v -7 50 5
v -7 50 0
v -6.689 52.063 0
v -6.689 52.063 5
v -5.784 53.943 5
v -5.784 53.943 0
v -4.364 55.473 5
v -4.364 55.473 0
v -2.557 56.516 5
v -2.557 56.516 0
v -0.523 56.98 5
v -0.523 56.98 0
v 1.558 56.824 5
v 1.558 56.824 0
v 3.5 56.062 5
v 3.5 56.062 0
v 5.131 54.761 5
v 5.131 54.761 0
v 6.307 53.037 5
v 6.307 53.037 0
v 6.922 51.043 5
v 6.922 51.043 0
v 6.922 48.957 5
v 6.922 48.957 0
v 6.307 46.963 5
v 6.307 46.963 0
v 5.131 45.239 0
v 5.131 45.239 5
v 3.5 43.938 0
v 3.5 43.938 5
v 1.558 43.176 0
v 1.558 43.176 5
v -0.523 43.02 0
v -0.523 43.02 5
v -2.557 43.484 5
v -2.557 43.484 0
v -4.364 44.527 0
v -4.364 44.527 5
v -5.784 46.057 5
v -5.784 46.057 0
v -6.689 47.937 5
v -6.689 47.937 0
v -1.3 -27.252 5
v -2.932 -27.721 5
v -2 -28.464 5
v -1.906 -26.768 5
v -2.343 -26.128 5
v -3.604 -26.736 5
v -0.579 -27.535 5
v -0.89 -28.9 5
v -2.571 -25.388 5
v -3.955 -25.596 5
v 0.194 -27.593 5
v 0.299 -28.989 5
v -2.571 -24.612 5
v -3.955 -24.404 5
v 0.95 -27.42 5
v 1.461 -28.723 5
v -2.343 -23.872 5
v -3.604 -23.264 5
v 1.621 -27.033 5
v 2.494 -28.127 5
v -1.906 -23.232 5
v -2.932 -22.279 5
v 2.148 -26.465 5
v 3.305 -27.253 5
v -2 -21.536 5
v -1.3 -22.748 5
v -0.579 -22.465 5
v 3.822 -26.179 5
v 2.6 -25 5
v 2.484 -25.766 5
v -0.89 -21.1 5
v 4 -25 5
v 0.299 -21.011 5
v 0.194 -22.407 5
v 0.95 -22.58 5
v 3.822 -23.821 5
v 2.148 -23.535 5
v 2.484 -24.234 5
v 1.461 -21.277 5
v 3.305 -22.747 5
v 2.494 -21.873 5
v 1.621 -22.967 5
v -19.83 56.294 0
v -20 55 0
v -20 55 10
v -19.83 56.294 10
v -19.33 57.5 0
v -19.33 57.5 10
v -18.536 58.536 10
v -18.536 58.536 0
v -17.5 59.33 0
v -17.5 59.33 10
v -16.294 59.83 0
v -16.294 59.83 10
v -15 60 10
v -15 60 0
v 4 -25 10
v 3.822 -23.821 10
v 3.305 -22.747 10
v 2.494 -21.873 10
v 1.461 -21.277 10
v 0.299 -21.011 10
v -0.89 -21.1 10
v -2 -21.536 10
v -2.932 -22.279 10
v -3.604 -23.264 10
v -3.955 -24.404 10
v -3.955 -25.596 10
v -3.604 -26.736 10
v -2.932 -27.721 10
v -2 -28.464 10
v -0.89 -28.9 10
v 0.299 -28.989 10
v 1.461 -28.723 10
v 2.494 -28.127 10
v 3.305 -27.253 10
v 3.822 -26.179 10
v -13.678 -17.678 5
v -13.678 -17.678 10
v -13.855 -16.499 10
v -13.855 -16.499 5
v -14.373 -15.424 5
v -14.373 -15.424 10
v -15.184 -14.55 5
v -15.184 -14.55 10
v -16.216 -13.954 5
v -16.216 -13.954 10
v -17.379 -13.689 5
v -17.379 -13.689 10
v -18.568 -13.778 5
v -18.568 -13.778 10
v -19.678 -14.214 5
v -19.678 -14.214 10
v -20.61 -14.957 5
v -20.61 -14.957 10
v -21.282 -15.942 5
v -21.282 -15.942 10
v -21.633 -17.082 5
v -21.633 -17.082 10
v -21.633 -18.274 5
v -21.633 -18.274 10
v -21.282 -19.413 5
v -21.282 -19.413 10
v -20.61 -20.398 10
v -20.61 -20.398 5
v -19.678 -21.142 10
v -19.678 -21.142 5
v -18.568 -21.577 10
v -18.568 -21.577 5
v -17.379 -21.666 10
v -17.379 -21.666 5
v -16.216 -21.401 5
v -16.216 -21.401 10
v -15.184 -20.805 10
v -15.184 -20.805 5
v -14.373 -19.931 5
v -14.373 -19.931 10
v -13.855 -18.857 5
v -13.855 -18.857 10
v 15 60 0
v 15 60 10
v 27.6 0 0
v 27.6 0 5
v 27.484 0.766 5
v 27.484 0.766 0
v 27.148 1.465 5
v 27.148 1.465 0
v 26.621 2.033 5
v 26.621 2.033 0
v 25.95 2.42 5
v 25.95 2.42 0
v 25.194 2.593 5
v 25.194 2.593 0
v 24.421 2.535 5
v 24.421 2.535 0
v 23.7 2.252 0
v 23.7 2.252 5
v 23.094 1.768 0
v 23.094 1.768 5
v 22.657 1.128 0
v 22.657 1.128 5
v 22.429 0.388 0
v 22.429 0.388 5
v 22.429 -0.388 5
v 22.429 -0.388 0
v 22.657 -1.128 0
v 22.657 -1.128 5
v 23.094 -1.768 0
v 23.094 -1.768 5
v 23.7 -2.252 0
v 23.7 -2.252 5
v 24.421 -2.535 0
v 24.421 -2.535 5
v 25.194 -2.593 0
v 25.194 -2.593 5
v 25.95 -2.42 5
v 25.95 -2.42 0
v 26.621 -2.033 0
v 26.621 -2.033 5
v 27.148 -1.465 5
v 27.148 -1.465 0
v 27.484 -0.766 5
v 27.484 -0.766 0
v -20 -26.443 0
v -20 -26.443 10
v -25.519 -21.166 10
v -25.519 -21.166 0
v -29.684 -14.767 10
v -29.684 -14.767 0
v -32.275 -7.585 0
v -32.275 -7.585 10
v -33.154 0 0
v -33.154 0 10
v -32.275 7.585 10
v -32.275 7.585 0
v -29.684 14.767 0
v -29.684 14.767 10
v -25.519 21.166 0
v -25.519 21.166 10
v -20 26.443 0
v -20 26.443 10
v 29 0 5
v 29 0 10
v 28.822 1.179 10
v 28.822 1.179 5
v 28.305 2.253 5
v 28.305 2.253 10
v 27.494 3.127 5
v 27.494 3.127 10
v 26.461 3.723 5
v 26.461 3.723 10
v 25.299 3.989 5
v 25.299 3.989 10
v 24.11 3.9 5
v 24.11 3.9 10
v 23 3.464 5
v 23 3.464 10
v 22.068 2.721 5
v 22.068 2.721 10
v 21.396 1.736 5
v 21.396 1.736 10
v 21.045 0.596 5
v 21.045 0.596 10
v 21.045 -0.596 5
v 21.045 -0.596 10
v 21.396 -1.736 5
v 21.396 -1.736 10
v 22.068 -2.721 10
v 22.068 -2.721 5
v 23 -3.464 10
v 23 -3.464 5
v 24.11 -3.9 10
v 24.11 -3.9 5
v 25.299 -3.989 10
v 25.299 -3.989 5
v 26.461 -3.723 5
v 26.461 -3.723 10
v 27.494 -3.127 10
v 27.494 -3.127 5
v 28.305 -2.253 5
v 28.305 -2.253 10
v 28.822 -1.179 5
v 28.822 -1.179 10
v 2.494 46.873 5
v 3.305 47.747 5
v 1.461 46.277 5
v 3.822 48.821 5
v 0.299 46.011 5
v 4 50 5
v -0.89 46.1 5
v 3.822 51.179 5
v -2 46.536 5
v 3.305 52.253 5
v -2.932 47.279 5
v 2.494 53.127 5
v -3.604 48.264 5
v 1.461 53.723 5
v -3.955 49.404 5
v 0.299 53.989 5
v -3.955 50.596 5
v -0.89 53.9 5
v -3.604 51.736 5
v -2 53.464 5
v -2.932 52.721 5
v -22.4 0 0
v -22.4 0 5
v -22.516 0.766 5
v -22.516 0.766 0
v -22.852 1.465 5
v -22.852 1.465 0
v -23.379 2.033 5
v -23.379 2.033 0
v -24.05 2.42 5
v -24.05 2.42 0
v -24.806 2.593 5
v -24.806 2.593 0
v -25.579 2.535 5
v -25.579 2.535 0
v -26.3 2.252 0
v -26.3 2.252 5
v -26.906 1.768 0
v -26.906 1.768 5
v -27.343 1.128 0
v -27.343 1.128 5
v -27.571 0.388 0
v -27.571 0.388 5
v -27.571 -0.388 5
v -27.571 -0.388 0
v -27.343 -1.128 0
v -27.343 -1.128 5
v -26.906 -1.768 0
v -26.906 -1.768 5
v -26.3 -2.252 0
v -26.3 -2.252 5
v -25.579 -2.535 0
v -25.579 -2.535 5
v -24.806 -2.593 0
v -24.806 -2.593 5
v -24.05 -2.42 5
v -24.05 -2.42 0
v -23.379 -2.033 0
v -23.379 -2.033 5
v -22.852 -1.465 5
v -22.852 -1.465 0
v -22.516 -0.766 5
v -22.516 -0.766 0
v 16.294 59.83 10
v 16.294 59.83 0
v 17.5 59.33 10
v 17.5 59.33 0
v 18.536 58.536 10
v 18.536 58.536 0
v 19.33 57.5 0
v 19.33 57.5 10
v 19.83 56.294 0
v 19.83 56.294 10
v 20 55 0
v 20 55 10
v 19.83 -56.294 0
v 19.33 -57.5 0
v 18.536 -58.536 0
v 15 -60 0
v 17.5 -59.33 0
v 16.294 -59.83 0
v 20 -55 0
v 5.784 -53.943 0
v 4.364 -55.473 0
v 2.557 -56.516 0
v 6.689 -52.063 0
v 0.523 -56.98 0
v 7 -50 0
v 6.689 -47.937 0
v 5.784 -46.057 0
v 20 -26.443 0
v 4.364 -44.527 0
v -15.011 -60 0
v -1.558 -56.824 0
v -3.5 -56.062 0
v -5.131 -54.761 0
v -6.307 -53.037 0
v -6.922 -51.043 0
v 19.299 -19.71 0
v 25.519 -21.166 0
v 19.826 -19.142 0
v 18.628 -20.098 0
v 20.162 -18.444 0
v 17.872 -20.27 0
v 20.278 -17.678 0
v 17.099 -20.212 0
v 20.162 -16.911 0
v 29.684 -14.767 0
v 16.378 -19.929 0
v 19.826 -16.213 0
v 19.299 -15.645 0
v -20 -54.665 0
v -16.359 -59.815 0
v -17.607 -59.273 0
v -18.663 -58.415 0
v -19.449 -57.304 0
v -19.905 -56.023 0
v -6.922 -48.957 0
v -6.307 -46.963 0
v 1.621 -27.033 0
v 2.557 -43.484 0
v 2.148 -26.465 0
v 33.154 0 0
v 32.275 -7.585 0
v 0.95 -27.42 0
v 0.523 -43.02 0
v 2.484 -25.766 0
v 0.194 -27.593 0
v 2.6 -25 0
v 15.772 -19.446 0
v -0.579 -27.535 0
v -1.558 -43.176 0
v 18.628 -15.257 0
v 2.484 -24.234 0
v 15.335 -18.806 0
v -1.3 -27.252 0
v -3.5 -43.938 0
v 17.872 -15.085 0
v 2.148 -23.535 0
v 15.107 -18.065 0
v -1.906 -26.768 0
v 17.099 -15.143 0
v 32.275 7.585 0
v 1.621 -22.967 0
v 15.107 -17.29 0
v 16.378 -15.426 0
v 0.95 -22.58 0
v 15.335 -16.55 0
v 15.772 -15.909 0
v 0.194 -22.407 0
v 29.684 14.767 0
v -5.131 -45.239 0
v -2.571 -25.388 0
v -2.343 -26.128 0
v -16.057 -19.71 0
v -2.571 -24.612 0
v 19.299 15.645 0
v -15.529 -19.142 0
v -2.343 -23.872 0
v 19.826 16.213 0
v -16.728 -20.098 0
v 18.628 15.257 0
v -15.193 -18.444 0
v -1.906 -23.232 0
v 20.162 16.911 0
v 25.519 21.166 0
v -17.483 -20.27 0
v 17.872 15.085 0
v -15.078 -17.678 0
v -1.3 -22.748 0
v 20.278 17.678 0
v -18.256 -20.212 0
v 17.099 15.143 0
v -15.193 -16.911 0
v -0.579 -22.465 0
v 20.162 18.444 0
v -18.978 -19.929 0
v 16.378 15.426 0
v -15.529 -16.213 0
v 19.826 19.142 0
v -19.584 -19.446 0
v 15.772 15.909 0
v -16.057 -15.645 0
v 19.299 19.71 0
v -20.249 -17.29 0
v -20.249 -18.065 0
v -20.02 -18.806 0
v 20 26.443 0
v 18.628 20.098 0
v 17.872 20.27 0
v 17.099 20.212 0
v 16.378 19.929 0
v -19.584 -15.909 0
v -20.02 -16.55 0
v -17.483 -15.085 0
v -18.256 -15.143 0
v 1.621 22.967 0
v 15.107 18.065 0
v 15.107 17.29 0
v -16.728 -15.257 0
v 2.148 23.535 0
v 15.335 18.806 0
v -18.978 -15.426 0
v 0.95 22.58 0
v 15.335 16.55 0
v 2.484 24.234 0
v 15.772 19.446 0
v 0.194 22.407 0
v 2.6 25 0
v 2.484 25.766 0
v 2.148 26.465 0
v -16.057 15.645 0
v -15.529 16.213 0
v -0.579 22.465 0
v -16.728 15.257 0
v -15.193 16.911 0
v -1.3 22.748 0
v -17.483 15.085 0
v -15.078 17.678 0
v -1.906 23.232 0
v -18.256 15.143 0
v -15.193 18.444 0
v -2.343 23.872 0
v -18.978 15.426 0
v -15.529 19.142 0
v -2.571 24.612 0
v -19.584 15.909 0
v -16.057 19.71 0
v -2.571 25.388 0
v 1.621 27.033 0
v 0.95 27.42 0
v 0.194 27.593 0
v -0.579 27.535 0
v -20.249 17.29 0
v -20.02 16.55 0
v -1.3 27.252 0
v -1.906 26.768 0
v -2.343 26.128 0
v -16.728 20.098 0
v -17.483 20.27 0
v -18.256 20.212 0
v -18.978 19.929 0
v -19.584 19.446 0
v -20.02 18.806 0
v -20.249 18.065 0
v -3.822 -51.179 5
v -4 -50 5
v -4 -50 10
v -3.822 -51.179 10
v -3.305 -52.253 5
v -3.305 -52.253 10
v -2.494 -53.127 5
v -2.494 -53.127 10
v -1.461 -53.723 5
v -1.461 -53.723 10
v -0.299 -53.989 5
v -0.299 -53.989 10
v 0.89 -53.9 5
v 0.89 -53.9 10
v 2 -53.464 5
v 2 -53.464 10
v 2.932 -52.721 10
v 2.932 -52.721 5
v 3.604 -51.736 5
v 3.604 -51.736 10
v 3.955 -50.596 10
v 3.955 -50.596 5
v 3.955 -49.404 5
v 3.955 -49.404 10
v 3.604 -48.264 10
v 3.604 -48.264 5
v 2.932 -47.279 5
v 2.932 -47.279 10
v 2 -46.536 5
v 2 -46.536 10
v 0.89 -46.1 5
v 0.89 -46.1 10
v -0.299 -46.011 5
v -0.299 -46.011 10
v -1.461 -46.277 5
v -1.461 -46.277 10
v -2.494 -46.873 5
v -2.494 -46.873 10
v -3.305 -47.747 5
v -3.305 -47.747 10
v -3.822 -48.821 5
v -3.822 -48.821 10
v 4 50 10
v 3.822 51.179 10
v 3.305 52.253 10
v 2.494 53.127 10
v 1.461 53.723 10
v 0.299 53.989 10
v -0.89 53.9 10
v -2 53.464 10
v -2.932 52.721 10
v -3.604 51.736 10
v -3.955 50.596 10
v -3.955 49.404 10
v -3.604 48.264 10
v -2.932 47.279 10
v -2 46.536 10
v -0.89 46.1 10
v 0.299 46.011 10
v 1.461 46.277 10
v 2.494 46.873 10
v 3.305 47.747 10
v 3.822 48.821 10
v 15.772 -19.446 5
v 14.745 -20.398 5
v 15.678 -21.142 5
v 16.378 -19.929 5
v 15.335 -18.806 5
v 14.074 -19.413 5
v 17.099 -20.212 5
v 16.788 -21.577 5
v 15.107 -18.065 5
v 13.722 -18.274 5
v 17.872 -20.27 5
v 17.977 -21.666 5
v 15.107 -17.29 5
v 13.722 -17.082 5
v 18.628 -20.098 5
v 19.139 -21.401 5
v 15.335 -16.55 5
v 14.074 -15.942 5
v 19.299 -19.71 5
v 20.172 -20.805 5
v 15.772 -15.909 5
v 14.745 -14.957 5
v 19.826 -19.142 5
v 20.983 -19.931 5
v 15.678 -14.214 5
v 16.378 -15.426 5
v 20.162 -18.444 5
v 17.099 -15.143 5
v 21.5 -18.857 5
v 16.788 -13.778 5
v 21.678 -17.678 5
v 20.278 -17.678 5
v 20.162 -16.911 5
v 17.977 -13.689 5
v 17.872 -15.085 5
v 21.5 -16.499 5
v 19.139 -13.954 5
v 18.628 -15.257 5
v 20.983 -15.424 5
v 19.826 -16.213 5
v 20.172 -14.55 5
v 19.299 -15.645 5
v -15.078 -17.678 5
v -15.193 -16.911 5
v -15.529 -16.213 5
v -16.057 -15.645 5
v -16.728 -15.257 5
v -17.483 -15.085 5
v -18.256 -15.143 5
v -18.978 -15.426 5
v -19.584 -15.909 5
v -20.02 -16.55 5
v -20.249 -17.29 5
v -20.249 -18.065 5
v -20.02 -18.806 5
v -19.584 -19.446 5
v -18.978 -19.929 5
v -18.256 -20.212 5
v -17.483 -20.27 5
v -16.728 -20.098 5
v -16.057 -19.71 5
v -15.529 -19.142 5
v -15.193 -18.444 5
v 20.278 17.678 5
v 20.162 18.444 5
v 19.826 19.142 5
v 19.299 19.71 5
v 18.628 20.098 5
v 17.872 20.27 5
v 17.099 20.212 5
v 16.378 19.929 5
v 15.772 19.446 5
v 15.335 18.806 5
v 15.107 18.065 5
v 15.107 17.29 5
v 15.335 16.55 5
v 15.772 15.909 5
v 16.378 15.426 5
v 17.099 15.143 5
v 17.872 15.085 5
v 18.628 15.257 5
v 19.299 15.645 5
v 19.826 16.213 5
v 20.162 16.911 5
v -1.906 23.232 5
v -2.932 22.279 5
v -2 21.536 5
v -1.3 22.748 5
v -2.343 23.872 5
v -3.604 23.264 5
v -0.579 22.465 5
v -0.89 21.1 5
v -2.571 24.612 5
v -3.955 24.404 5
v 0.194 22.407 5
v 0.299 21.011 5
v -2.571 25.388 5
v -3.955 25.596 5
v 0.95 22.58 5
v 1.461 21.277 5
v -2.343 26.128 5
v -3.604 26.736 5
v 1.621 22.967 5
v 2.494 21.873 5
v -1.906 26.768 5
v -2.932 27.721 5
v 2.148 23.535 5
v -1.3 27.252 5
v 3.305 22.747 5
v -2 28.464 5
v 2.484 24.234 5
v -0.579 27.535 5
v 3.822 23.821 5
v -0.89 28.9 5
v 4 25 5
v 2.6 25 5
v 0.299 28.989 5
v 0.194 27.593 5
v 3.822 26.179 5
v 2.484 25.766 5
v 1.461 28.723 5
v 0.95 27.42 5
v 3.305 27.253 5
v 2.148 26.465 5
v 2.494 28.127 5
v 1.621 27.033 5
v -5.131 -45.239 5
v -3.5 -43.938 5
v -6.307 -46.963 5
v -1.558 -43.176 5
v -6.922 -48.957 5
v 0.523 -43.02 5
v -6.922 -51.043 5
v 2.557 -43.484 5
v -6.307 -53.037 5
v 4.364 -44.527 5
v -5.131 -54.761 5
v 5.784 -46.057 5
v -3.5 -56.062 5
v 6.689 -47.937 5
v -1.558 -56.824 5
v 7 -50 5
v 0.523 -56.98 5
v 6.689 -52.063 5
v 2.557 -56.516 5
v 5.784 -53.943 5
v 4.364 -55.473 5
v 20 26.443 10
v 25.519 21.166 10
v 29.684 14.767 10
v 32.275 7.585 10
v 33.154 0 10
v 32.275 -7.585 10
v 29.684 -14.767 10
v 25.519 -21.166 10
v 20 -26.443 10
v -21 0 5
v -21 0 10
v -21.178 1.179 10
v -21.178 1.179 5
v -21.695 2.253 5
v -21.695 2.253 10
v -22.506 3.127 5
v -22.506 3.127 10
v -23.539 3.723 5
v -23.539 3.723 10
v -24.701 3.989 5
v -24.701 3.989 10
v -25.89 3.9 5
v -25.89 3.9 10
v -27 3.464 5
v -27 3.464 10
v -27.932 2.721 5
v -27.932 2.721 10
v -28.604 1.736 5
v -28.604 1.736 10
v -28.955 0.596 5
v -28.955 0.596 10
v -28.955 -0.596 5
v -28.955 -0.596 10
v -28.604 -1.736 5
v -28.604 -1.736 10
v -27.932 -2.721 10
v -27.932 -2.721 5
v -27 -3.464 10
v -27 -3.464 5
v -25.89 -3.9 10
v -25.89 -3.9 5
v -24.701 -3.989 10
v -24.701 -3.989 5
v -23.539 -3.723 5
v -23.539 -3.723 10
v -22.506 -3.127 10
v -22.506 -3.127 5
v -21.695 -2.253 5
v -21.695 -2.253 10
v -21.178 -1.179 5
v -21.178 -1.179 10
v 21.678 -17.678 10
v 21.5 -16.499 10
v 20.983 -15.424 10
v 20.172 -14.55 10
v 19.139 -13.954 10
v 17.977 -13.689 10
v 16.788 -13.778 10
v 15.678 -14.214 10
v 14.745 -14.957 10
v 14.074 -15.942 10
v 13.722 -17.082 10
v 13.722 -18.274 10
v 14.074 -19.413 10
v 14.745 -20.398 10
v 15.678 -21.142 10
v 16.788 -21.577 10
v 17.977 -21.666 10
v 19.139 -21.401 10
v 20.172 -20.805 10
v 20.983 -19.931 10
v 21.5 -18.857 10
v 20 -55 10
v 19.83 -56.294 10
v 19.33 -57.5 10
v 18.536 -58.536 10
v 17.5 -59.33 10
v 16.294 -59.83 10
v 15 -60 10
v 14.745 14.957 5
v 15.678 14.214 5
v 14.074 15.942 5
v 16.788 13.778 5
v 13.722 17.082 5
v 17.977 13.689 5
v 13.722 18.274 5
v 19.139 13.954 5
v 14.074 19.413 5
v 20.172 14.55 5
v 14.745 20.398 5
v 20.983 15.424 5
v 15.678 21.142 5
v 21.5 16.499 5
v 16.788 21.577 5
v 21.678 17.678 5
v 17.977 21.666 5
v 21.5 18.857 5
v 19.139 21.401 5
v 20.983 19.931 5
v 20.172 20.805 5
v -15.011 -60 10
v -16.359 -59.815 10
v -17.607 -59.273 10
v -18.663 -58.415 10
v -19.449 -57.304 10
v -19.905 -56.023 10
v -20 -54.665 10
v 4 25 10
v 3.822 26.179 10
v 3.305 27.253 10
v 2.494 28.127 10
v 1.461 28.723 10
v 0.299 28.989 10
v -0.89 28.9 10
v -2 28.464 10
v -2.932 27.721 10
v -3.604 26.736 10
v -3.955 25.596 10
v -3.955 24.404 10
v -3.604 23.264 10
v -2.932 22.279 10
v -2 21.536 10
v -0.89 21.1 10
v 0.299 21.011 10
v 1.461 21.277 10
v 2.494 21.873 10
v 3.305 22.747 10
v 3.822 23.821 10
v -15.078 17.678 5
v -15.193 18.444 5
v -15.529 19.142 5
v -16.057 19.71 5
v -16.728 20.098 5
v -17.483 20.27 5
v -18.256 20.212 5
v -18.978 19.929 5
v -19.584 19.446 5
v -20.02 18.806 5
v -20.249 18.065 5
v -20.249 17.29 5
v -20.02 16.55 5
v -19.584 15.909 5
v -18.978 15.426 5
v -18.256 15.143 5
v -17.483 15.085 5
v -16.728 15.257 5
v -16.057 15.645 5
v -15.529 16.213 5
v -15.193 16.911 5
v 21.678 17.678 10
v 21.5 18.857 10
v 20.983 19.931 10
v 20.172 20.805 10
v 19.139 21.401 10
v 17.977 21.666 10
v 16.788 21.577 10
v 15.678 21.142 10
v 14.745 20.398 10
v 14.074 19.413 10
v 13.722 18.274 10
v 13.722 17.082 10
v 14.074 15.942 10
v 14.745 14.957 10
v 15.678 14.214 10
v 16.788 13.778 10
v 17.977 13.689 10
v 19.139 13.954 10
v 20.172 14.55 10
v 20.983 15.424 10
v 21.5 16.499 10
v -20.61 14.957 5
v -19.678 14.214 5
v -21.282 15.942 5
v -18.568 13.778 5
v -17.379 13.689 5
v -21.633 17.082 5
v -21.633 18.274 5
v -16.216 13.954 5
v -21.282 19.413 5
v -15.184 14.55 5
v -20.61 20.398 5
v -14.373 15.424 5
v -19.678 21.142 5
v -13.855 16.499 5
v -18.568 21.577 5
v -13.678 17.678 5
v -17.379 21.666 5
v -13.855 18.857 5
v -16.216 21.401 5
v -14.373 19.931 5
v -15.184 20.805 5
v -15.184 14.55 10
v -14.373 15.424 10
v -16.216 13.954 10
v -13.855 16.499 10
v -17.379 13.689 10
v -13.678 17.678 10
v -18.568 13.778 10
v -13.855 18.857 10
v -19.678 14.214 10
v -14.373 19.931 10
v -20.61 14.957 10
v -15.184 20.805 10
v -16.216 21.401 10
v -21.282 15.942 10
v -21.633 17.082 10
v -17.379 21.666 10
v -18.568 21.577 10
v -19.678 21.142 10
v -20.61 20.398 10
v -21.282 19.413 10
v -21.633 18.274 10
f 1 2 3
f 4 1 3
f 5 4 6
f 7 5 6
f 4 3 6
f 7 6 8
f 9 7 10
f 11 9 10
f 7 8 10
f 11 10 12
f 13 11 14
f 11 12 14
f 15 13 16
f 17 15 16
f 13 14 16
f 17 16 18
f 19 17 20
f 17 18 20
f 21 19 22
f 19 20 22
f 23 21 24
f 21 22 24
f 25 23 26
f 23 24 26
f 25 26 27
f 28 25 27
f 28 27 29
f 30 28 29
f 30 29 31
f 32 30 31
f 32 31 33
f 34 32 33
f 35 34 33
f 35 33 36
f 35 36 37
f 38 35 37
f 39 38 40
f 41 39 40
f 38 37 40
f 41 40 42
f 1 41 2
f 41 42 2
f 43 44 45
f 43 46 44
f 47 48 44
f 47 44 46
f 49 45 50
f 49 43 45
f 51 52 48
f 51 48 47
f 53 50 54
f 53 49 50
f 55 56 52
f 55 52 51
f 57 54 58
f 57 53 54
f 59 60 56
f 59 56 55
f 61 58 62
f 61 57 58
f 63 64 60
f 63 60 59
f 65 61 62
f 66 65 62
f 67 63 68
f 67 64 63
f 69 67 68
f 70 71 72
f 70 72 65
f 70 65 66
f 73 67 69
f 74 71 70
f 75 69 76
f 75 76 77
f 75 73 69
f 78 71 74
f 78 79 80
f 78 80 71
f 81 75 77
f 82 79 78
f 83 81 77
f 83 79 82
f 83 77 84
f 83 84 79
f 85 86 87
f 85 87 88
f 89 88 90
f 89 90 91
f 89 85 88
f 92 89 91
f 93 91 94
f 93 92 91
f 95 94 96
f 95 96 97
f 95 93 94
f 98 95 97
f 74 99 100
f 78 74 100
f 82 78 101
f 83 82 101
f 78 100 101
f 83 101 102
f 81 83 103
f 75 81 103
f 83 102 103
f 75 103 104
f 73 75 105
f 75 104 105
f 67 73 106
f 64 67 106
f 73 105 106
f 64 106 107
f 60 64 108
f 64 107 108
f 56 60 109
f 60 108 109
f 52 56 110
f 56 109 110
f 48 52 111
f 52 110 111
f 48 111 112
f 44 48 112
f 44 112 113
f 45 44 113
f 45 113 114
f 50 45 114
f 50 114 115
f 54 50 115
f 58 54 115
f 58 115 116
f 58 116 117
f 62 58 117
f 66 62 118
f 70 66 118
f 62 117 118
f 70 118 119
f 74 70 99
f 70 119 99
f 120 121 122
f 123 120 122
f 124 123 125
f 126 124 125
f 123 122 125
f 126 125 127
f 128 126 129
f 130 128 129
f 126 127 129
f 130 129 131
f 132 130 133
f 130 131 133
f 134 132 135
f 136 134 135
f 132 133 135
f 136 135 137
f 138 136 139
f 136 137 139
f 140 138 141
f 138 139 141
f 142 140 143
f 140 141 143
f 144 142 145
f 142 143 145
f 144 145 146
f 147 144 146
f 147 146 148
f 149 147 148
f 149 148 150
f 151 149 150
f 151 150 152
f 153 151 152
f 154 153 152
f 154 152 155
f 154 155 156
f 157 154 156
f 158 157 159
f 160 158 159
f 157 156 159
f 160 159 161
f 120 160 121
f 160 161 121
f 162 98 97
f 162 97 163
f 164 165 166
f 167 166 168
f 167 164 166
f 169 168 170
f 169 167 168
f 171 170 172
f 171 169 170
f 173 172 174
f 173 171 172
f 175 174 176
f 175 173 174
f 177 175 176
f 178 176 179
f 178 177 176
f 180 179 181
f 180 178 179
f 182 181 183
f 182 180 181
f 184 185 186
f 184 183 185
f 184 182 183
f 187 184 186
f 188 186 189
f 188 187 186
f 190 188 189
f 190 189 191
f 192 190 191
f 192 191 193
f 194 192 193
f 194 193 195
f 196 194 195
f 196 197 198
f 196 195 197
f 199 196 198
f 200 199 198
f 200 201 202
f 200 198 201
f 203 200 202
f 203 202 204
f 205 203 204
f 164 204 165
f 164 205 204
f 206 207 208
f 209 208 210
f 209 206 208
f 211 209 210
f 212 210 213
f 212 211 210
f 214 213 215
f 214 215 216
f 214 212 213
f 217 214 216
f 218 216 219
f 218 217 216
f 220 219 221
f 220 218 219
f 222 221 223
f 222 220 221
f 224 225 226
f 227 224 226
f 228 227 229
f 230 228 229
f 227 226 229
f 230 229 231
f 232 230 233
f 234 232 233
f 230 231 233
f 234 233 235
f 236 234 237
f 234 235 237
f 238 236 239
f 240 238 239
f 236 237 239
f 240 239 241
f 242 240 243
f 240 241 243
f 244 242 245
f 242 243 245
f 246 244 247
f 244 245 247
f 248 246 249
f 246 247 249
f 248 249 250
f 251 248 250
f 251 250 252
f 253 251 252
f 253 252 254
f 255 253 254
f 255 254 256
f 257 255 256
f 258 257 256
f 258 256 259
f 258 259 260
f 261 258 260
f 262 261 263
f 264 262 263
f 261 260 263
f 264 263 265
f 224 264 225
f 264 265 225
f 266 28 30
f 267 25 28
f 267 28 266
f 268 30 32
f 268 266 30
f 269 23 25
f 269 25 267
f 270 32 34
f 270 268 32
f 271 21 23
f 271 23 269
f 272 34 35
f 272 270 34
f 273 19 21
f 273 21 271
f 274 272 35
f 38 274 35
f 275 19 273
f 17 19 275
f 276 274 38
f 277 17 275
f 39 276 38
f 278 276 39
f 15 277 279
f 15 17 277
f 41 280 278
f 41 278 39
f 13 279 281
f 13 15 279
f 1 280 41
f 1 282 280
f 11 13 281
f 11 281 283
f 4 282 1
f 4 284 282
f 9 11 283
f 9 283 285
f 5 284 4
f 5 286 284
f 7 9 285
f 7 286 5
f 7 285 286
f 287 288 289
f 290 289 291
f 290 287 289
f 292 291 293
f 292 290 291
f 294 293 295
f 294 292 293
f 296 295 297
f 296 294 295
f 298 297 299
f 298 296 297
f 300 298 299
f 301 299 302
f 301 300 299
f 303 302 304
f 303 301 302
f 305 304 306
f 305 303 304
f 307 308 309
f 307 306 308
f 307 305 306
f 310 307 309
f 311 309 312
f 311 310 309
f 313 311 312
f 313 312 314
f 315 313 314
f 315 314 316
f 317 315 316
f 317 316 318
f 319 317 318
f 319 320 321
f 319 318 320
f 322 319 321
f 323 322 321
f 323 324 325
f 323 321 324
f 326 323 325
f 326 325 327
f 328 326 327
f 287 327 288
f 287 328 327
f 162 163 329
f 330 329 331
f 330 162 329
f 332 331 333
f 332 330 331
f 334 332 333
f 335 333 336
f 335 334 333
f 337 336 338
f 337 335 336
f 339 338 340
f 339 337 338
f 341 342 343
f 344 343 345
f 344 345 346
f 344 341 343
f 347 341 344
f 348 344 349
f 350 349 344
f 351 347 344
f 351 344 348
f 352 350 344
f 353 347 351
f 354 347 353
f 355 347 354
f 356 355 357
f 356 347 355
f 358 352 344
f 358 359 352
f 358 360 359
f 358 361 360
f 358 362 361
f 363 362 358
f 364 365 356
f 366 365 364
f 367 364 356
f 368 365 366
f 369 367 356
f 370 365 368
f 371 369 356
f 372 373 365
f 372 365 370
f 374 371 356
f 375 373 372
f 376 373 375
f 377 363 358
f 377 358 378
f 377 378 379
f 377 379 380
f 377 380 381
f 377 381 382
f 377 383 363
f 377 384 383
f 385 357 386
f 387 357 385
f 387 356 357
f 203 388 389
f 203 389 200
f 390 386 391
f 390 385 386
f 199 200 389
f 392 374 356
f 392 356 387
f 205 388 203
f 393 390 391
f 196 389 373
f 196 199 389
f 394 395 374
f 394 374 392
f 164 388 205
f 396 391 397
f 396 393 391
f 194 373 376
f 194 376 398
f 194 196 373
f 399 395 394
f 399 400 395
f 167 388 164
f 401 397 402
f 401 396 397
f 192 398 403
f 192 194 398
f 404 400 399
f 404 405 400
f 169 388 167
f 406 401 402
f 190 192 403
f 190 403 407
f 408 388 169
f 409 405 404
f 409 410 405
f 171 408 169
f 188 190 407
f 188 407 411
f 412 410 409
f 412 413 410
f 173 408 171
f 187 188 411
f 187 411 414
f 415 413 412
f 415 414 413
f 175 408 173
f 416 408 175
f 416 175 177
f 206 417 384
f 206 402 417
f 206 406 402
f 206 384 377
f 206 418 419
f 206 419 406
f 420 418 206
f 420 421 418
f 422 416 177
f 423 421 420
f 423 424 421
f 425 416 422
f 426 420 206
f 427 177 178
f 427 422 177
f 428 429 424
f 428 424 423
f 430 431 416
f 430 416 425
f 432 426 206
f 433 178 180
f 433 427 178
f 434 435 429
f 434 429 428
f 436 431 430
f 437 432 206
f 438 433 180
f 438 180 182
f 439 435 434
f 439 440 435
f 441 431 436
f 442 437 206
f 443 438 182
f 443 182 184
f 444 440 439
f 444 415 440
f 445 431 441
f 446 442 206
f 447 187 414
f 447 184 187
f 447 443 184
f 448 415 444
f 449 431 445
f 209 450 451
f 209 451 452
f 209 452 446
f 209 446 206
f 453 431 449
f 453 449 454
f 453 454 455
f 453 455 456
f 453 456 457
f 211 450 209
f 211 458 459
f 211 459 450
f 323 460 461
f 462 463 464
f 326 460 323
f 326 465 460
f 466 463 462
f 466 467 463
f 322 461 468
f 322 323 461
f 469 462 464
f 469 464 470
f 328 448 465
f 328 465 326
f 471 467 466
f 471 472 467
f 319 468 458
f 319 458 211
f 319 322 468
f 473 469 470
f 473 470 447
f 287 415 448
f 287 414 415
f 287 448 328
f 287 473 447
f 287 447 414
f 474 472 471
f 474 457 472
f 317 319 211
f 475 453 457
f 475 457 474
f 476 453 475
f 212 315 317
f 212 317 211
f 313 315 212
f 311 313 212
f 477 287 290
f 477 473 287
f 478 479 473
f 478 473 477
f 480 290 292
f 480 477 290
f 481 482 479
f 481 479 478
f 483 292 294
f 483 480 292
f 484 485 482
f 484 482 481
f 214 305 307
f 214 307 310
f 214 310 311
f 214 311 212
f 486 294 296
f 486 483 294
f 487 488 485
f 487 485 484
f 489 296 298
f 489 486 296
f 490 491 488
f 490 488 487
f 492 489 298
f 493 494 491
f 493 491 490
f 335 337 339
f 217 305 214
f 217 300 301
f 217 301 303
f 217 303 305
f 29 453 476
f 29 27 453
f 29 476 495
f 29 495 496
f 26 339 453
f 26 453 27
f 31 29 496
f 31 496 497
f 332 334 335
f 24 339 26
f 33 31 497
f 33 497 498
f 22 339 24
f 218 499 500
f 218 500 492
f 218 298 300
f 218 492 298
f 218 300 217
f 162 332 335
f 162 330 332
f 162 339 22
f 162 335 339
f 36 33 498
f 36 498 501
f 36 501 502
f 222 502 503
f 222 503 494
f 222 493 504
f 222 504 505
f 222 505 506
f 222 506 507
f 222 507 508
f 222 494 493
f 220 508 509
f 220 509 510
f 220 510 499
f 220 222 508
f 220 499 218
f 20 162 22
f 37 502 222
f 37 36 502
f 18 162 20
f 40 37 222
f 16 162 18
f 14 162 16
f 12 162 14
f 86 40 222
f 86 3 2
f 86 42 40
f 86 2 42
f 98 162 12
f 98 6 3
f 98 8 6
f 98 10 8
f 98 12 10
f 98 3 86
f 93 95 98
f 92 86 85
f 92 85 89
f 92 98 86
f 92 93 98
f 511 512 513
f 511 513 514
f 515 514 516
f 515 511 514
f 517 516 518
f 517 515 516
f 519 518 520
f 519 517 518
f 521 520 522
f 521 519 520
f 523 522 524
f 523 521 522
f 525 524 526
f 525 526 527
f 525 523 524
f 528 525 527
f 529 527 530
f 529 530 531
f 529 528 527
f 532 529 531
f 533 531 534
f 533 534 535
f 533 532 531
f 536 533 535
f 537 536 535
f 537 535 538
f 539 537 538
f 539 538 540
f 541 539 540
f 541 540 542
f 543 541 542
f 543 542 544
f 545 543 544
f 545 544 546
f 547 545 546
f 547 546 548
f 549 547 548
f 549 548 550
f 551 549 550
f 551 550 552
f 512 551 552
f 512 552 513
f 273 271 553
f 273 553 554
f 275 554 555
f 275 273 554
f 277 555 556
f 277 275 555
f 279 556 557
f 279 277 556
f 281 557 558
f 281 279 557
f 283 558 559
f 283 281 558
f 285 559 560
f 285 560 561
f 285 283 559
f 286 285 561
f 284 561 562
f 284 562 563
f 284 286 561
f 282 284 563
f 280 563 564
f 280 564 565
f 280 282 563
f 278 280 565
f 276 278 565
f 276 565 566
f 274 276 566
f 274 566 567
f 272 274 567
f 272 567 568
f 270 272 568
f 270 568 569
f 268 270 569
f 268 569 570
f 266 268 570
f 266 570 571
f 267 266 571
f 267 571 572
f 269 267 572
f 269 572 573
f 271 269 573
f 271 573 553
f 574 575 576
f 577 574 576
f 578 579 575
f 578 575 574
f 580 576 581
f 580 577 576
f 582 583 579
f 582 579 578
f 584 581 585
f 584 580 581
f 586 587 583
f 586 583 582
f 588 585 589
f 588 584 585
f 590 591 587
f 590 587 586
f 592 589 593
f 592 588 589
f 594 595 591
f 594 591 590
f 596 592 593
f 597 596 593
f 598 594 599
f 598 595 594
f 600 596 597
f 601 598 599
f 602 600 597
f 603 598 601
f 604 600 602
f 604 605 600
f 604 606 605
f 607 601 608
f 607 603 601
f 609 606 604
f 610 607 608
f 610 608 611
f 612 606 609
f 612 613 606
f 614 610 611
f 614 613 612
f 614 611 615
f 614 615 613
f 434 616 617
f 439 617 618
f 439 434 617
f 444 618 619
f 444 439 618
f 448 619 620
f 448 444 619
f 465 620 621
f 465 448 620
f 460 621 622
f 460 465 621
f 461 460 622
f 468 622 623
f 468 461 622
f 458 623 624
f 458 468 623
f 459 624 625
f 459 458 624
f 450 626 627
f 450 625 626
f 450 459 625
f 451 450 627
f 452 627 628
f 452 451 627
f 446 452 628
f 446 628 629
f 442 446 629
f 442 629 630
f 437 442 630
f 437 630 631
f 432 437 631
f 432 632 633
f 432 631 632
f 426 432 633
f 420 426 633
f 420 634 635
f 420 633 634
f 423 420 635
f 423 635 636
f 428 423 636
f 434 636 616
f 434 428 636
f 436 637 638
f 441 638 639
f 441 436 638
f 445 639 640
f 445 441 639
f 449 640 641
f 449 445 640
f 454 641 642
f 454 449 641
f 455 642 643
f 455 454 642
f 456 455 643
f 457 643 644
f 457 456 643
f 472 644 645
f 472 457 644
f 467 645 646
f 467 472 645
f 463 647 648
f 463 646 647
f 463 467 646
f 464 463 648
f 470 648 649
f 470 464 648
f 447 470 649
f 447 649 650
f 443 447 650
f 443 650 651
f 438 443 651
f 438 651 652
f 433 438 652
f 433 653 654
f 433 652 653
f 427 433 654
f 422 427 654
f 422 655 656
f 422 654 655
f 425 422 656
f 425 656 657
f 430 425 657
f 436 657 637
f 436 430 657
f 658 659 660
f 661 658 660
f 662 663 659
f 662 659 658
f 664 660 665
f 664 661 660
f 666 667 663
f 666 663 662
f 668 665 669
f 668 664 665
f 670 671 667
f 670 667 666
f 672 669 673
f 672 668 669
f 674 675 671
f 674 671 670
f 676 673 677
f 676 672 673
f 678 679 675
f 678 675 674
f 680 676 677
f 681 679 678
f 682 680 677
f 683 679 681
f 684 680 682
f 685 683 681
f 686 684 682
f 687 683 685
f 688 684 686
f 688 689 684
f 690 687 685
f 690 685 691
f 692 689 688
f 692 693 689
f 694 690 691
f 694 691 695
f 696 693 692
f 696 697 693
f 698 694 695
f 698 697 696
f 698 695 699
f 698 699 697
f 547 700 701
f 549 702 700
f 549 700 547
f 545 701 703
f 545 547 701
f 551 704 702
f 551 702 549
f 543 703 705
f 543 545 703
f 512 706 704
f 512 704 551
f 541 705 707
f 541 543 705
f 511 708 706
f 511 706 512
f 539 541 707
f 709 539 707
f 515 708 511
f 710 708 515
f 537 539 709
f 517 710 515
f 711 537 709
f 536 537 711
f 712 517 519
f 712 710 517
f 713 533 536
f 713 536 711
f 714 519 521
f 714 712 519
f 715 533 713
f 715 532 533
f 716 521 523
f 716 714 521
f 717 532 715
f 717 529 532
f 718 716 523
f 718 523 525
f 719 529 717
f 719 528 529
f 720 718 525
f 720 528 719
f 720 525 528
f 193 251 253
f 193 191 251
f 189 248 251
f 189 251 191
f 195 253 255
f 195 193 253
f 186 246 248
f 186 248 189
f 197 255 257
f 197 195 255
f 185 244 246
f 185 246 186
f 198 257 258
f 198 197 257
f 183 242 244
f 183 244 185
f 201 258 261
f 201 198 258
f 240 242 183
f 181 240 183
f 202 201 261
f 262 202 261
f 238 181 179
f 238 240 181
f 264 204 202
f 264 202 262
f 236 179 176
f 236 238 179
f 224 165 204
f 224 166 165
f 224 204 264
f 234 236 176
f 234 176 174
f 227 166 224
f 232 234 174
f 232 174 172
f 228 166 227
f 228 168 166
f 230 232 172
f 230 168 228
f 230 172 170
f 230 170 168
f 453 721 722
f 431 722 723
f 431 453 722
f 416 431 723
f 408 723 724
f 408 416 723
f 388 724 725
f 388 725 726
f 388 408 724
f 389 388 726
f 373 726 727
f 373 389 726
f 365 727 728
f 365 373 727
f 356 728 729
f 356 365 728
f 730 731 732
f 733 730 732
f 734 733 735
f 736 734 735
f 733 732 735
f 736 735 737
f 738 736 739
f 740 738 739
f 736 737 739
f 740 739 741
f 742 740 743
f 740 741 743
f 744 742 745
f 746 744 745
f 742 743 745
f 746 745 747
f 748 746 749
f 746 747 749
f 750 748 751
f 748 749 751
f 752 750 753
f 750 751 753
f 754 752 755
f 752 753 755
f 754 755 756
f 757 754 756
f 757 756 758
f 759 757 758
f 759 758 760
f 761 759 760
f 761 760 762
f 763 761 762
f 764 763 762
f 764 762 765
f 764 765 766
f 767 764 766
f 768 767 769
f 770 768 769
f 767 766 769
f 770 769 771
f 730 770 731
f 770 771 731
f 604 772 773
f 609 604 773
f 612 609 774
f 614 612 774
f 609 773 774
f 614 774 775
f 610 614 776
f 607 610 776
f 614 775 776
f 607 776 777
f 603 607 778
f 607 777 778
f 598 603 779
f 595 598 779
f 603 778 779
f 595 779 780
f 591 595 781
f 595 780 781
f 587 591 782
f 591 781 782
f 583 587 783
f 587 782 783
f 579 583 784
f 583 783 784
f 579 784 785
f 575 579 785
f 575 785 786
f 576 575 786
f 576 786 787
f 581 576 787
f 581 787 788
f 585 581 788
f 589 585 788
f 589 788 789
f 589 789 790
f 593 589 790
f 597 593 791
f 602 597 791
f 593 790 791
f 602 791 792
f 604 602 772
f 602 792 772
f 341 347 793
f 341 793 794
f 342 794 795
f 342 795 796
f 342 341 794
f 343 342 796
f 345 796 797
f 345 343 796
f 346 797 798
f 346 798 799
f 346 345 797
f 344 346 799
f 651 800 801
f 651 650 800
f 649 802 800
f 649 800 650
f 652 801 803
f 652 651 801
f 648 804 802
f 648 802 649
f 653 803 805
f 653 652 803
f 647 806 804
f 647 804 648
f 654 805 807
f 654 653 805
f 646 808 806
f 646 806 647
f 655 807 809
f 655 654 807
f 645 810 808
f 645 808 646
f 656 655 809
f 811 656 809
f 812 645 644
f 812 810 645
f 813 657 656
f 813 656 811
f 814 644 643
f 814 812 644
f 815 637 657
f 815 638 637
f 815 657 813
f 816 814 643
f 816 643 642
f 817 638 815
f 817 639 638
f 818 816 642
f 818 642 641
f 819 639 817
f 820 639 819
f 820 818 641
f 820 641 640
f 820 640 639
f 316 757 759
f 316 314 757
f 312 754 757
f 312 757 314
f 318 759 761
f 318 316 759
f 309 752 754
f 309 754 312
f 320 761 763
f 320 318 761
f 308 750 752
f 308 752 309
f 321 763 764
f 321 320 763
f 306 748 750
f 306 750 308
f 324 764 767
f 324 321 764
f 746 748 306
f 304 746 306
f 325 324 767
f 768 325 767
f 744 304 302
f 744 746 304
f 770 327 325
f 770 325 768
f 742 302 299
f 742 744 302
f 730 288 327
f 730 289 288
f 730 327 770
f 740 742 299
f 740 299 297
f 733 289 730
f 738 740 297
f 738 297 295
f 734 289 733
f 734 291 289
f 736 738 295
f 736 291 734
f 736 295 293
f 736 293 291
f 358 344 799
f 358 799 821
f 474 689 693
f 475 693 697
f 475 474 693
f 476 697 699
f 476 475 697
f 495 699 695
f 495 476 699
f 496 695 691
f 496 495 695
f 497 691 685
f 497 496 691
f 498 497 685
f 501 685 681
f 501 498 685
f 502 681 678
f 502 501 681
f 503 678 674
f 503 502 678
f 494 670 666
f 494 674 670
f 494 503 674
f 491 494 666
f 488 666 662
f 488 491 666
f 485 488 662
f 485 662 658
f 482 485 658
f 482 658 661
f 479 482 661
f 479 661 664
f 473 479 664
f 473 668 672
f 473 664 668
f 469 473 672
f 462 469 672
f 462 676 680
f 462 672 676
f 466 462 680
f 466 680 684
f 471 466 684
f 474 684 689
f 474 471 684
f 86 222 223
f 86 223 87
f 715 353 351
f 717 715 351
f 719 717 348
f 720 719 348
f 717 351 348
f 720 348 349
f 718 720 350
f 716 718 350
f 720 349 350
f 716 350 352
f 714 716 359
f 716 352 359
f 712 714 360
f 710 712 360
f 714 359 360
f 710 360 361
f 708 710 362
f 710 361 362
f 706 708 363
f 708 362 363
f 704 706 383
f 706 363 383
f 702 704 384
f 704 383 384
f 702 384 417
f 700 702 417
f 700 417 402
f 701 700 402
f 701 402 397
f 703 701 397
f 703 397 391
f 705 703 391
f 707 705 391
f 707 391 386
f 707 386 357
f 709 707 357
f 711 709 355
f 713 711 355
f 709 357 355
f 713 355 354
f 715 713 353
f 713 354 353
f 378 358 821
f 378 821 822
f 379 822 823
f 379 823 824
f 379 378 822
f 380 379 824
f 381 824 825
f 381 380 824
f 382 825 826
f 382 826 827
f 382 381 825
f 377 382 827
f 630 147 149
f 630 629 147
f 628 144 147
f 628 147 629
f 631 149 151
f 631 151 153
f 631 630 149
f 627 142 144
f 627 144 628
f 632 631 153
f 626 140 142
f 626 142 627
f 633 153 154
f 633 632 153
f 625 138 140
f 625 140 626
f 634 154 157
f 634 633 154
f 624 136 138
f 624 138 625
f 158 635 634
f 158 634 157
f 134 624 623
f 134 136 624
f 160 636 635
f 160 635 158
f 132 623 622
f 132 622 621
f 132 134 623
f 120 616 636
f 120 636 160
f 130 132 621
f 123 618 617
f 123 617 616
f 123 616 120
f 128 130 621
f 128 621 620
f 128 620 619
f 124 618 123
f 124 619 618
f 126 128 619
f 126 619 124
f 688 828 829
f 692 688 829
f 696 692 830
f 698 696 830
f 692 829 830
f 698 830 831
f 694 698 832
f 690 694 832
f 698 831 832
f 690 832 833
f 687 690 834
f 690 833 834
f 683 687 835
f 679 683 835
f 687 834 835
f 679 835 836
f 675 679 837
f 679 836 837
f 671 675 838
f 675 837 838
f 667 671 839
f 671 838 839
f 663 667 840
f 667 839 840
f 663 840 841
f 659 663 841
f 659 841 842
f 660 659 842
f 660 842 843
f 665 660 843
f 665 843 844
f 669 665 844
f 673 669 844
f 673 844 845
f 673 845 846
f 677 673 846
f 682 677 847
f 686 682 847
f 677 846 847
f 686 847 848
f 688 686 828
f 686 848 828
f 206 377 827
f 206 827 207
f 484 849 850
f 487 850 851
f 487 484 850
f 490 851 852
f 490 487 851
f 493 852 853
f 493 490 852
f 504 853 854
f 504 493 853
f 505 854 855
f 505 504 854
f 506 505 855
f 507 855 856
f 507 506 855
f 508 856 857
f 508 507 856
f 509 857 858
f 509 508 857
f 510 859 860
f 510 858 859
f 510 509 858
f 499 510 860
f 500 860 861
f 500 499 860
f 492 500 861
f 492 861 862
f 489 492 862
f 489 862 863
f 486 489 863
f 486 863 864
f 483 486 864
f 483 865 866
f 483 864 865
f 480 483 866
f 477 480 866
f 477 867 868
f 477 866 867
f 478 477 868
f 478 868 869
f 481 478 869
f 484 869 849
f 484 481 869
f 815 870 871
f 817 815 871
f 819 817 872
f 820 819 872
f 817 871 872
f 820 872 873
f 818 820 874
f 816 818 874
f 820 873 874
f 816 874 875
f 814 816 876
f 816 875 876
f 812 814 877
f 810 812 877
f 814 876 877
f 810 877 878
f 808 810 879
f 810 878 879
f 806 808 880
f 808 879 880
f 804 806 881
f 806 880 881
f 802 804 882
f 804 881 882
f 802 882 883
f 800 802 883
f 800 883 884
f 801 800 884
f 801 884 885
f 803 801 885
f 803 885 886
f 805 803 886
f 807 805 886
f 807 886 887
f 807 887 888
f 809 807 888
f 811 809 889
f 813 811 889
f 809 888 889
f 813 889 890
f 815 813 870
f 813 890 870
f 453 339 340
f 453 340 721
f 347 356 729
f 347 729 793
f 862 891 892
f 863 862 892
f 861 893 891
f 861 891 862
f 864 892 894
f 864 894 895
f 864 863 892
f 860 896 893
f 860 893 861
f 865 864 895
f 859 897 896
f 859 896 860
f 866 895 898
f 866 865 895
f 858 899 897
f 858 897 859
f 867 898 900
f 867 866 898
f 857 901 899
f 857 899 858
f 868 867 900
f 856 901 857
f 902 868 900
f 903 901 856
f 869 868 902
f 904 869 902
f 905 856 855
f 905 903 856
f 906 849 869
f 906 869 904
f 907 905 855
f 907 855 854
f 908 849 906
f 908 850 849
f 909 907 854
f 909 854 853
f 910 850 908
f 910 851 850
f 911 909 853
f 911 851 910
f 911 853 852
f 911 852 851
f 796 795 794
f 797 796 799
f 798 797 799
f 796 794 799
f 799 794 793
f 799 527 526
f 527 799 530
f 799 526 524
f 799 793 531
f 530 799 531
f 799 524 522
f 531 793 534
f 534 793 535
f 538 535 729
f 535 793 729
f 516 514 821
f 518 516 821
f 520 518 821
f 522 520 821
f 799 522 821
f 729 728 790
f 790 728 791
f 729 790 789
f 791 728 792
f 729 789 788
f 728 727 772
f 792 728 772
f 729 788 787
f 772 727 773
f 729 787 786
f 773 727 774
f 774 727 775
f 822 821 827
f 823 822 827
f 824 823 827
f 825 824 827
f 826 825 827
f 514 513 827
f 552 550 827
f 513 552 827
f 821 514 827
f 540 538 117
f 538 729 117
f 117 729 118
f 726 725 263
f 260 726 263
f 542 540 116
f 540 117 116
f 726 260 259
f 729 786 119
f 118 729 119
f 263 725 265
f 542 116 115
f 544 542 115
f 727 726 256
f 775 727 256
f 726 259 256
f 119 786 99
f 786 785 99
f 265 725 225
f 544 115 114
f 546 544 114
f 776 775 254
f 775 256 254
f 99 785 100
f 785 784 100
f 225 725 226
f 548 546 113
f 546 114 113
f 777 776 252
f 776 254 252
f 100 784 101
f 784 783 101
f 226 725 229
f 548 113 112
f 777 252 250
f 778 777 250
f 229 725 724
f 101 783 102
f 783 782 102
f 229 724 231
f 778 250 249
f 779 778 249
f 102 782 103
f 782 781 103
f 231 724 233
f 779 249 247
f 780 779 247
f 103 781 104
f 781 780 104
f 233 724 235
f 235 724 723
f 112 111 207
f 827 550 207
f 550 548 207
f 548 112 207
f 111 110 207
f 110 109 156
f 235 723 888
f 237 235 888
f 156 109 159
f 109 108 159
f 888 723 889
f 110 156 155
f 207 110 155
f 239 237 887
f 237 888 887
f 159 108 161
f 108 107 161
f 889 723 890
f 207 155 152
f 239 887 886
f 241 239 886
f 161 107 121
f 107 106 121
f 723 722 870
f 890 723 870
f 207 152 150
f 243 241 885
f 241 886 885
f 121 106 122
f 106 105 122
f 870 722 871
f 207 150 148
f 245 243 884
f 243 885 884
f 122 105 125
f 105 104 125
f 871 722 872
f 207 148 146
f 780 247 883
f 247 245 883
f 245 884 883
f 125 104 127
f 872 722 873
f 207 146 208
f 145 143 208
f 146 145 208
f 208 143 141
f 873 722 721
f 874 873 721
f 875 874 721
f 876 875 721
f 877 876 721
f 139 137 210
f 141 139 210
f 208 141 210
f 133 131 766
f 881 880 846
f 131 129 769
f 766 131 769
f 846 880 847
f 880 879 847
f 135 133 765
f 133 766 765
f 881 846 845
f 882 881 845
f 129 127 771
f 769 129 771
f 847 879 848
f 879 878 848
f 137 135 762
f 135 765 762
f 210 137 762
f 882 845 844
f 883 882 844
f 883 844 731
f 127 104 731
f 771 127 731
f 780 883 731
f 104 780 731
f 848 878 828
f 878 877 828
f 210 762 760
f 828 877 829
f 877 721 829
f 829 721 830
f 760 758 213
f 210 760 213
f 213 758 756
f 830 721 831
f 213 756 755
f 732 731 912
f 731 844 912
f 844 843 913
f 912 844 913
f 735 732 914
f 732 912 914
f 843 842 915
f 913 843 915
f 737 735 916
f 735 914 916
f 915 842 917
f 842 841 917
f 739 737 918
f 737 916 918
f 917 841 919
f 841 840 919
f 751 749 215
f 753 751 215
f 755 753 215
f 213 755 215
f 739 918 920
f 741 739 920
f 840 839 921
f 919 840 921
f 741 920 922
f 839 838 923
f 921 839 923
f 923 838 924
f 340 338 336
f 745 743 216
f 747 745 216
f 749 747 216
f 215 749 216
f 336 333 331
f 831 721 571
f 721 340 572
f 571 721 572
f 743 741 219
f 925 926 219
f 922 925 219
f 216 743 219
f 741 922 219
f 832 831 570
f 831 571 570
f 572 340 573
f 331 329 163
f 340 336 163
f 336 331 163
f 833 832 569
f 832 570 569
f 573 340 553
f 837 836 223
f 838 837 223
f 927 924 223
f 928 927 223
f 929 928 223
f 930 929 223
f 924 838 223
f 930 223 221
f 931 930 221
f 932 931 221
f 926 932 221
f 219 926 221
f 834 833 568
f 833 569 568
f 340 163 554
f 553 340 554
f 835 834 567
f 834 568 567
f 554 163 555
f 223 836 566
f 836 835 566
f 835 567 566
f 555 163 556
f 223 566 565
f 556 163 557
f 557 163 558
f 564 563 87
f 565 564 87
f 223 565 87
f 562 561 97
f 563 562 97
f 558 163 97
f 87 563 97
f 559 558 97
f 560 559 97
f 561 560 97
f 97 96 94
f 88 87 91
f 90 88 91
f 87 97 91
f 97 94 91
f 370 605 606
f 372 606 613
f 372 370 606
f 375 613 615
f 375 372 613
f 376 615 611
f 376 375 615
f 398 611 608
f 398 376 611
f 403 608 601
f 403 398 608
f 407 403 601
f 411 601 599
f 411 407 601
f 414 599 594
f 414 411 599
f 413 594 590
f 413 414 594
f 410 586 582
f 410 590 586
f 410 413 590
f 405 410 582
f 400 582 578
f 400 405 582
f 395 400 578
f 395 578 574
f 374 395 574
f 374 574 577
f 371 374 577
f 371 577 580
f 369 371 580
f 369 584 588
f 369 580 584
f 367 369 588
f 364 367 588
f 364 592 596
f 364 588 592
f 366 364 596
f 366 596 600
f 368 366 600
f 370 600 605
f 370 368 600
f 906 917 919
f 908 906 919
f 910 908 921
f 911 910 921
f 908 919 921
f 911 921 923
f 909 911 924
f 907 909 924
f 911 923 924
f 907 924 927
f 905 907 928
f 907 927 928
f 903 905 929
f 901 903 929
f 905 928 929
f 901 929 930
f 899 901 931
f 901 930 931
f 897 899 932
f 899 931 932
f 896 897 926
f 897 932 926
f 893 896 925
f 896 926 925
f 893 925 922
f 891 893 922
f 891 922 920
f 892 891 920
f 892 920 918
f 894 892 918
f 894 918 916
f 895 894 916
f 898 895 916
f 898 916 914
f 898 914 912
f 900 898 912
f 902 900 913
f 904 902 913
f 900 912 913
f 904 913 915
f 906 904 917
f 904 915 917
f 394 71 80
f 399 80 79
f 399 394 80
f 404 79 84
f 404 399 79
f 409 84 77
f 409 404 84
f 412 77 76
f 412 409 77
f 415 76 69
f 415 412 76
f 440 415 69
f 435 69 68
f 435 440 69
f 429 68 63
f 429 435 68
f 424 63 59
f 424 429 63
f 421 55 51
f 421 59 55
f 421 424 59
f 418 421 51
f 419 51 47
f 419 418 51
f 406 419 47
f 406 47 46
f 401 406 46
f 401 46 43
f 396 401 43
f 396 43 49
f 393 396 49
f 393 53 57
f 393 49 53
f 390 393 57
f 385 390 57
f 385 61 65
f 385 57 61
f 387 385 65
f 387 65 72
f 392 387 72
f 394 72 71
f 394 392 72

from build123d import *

# Parameters (mm, degrees)
MODEL_R                 = 2.6
MODEL_R_2               = 4
SALIENTE_EXTRUIR1_DEPTH = 10
CROQUIS3_R              = 4
CORTAR_EXTRUIR1_DEPTH   = 5
CROQUIS4_R              = 7
CORTAR_EXTRUIR2_DEPTH   = 5


with BuildPart() as part:
    # Model → Saliente-Extruir1 (new body)
    with BuildSketch(Plane.XY):
        with BuildLine():
            Line((-15, 60), (15, 60))
            ThreePointArc((15, 60), (18.535533906, 58.535533906), (20, 55))
            Line((20, 55), (20, 26.442576537))
            ThreePointArc((20, 26.442576537), (33.154333863, 0), (20, -26.442576537))
            Line((20, -26.442576537), (20, -55))
            ThreePointArc((20, -55), (18.535533906, -58.535533906), (15, -60))
            Line((15, -60), (-15.011202946, -60))
            ThreePointArc((-15.011202946, -60), (-18.663093033, -58.415215776), (-20, -54.665479518))
            Line((-20, -54.665479518), (-20, -26.442576537))
            ThreePointArc((-20, -26.442576537), (-33.154333863, 0), (-20, 26.442576537))
            Line((-20, 26.442576537), (-20, 55))
            ThreePointArc((-20, 55), (-18.535533906, 58.535533906), (-15, 60))
        make_face()
        with Locations((-17.67766953, 17.677669526)):
            Circle(MODEL_R, mode=Mode.SUBTRACT)
        with Locations((-2e-09, 24.999999998)):
            Circle(MODEL_R, mode=Mode.SUBTRACT)
        with Locations((-24.999999998, -2e-09)):
            Circle(MODEL_R, mode=Mode.SUBTRACT)
        with Locations((17.677669526, 17.67766953)):
            Circle(MODEL_R, mode=Mode.SUBTRACT)
        with Locations((24.999999998, 2e-09)):
            Circle(MODEL_R, mode=Mode.SUBTRACT)
        with Locations((17.67766953, -17.677669526)):
            Circle(MODEL_R, mode=Mode.SUBTRACT)
        with Locations((2e-09, -24.999999998)):
            Circle(MODEL_R, mode=Mode.SUBTRACT)
        with Locations((-17.677669526, -17.67766953)):
            Circle(MODEL_R, mode=Mode.SUBTRACT)
        with Locations((0, 50)):
            Circle(MODEL_R_2, mode=Mode.SUBTRACT)
        with Locations(Location((0, -50, 0), (0, 0, 180))):
            Circle(MODEL_R_2, mode=Mode.SUBTRACT)
    extrude(amount=SALIENTE_EXTRUIR1_DEPTH)

    # Croquis3 → Cortar-Extruir1 (cut)
    with BuildSketch(Plane.XY.offset(10)):
        with Locations((24.999999998, 2e-09)):
            Circle(CROQUIS3_R)
        with Locations((17.67766953, -17.677669526)):
            Circle(CROQUIS3_R)
        with Locations((2e-09, -24.999999998)):
            Circle(CROQUIS3_R)
        with Locations((-17.677669526, -17.67766953)):
            Circle(CROQUIS3_R)
        with Locations((-24.999999998, -2e-09)):
            Circle(CROQUIS3_R)
        with Locations((-17.67766953, 17.677669526)):
            Circle(CROQUIS3_R)
        with Locations((-2e-09, 24.999999998)):
            Circle(CROQUIS3_R)
        with Locations((17.677669526, 17.67766953)):
            Circle(CROQUIS3_R)
    extrude(amount=-CORTAR_EXTRUIR1_DEPTH, mode=Mode.SUBTRACT)

    # Croquis4 → Cortar-Extruir2 (cut)
    with BuildSketch(Plane(origin=(0, 0, 0), x_dir=(-1, 0, 0), z_dir=(0, 0, -1))):
        with Locations((0, 50)):
            Circle(CROQUIS4_R)
        with Locations(Location((0, -50, 0), (0, 0, 180))):
            Circle(CROQUIS4_R)
    extrude(amount=-CORTAR_EXTRUIR2_DEPTH, mode=Mode.SUBTRACT)


solid = part.part
